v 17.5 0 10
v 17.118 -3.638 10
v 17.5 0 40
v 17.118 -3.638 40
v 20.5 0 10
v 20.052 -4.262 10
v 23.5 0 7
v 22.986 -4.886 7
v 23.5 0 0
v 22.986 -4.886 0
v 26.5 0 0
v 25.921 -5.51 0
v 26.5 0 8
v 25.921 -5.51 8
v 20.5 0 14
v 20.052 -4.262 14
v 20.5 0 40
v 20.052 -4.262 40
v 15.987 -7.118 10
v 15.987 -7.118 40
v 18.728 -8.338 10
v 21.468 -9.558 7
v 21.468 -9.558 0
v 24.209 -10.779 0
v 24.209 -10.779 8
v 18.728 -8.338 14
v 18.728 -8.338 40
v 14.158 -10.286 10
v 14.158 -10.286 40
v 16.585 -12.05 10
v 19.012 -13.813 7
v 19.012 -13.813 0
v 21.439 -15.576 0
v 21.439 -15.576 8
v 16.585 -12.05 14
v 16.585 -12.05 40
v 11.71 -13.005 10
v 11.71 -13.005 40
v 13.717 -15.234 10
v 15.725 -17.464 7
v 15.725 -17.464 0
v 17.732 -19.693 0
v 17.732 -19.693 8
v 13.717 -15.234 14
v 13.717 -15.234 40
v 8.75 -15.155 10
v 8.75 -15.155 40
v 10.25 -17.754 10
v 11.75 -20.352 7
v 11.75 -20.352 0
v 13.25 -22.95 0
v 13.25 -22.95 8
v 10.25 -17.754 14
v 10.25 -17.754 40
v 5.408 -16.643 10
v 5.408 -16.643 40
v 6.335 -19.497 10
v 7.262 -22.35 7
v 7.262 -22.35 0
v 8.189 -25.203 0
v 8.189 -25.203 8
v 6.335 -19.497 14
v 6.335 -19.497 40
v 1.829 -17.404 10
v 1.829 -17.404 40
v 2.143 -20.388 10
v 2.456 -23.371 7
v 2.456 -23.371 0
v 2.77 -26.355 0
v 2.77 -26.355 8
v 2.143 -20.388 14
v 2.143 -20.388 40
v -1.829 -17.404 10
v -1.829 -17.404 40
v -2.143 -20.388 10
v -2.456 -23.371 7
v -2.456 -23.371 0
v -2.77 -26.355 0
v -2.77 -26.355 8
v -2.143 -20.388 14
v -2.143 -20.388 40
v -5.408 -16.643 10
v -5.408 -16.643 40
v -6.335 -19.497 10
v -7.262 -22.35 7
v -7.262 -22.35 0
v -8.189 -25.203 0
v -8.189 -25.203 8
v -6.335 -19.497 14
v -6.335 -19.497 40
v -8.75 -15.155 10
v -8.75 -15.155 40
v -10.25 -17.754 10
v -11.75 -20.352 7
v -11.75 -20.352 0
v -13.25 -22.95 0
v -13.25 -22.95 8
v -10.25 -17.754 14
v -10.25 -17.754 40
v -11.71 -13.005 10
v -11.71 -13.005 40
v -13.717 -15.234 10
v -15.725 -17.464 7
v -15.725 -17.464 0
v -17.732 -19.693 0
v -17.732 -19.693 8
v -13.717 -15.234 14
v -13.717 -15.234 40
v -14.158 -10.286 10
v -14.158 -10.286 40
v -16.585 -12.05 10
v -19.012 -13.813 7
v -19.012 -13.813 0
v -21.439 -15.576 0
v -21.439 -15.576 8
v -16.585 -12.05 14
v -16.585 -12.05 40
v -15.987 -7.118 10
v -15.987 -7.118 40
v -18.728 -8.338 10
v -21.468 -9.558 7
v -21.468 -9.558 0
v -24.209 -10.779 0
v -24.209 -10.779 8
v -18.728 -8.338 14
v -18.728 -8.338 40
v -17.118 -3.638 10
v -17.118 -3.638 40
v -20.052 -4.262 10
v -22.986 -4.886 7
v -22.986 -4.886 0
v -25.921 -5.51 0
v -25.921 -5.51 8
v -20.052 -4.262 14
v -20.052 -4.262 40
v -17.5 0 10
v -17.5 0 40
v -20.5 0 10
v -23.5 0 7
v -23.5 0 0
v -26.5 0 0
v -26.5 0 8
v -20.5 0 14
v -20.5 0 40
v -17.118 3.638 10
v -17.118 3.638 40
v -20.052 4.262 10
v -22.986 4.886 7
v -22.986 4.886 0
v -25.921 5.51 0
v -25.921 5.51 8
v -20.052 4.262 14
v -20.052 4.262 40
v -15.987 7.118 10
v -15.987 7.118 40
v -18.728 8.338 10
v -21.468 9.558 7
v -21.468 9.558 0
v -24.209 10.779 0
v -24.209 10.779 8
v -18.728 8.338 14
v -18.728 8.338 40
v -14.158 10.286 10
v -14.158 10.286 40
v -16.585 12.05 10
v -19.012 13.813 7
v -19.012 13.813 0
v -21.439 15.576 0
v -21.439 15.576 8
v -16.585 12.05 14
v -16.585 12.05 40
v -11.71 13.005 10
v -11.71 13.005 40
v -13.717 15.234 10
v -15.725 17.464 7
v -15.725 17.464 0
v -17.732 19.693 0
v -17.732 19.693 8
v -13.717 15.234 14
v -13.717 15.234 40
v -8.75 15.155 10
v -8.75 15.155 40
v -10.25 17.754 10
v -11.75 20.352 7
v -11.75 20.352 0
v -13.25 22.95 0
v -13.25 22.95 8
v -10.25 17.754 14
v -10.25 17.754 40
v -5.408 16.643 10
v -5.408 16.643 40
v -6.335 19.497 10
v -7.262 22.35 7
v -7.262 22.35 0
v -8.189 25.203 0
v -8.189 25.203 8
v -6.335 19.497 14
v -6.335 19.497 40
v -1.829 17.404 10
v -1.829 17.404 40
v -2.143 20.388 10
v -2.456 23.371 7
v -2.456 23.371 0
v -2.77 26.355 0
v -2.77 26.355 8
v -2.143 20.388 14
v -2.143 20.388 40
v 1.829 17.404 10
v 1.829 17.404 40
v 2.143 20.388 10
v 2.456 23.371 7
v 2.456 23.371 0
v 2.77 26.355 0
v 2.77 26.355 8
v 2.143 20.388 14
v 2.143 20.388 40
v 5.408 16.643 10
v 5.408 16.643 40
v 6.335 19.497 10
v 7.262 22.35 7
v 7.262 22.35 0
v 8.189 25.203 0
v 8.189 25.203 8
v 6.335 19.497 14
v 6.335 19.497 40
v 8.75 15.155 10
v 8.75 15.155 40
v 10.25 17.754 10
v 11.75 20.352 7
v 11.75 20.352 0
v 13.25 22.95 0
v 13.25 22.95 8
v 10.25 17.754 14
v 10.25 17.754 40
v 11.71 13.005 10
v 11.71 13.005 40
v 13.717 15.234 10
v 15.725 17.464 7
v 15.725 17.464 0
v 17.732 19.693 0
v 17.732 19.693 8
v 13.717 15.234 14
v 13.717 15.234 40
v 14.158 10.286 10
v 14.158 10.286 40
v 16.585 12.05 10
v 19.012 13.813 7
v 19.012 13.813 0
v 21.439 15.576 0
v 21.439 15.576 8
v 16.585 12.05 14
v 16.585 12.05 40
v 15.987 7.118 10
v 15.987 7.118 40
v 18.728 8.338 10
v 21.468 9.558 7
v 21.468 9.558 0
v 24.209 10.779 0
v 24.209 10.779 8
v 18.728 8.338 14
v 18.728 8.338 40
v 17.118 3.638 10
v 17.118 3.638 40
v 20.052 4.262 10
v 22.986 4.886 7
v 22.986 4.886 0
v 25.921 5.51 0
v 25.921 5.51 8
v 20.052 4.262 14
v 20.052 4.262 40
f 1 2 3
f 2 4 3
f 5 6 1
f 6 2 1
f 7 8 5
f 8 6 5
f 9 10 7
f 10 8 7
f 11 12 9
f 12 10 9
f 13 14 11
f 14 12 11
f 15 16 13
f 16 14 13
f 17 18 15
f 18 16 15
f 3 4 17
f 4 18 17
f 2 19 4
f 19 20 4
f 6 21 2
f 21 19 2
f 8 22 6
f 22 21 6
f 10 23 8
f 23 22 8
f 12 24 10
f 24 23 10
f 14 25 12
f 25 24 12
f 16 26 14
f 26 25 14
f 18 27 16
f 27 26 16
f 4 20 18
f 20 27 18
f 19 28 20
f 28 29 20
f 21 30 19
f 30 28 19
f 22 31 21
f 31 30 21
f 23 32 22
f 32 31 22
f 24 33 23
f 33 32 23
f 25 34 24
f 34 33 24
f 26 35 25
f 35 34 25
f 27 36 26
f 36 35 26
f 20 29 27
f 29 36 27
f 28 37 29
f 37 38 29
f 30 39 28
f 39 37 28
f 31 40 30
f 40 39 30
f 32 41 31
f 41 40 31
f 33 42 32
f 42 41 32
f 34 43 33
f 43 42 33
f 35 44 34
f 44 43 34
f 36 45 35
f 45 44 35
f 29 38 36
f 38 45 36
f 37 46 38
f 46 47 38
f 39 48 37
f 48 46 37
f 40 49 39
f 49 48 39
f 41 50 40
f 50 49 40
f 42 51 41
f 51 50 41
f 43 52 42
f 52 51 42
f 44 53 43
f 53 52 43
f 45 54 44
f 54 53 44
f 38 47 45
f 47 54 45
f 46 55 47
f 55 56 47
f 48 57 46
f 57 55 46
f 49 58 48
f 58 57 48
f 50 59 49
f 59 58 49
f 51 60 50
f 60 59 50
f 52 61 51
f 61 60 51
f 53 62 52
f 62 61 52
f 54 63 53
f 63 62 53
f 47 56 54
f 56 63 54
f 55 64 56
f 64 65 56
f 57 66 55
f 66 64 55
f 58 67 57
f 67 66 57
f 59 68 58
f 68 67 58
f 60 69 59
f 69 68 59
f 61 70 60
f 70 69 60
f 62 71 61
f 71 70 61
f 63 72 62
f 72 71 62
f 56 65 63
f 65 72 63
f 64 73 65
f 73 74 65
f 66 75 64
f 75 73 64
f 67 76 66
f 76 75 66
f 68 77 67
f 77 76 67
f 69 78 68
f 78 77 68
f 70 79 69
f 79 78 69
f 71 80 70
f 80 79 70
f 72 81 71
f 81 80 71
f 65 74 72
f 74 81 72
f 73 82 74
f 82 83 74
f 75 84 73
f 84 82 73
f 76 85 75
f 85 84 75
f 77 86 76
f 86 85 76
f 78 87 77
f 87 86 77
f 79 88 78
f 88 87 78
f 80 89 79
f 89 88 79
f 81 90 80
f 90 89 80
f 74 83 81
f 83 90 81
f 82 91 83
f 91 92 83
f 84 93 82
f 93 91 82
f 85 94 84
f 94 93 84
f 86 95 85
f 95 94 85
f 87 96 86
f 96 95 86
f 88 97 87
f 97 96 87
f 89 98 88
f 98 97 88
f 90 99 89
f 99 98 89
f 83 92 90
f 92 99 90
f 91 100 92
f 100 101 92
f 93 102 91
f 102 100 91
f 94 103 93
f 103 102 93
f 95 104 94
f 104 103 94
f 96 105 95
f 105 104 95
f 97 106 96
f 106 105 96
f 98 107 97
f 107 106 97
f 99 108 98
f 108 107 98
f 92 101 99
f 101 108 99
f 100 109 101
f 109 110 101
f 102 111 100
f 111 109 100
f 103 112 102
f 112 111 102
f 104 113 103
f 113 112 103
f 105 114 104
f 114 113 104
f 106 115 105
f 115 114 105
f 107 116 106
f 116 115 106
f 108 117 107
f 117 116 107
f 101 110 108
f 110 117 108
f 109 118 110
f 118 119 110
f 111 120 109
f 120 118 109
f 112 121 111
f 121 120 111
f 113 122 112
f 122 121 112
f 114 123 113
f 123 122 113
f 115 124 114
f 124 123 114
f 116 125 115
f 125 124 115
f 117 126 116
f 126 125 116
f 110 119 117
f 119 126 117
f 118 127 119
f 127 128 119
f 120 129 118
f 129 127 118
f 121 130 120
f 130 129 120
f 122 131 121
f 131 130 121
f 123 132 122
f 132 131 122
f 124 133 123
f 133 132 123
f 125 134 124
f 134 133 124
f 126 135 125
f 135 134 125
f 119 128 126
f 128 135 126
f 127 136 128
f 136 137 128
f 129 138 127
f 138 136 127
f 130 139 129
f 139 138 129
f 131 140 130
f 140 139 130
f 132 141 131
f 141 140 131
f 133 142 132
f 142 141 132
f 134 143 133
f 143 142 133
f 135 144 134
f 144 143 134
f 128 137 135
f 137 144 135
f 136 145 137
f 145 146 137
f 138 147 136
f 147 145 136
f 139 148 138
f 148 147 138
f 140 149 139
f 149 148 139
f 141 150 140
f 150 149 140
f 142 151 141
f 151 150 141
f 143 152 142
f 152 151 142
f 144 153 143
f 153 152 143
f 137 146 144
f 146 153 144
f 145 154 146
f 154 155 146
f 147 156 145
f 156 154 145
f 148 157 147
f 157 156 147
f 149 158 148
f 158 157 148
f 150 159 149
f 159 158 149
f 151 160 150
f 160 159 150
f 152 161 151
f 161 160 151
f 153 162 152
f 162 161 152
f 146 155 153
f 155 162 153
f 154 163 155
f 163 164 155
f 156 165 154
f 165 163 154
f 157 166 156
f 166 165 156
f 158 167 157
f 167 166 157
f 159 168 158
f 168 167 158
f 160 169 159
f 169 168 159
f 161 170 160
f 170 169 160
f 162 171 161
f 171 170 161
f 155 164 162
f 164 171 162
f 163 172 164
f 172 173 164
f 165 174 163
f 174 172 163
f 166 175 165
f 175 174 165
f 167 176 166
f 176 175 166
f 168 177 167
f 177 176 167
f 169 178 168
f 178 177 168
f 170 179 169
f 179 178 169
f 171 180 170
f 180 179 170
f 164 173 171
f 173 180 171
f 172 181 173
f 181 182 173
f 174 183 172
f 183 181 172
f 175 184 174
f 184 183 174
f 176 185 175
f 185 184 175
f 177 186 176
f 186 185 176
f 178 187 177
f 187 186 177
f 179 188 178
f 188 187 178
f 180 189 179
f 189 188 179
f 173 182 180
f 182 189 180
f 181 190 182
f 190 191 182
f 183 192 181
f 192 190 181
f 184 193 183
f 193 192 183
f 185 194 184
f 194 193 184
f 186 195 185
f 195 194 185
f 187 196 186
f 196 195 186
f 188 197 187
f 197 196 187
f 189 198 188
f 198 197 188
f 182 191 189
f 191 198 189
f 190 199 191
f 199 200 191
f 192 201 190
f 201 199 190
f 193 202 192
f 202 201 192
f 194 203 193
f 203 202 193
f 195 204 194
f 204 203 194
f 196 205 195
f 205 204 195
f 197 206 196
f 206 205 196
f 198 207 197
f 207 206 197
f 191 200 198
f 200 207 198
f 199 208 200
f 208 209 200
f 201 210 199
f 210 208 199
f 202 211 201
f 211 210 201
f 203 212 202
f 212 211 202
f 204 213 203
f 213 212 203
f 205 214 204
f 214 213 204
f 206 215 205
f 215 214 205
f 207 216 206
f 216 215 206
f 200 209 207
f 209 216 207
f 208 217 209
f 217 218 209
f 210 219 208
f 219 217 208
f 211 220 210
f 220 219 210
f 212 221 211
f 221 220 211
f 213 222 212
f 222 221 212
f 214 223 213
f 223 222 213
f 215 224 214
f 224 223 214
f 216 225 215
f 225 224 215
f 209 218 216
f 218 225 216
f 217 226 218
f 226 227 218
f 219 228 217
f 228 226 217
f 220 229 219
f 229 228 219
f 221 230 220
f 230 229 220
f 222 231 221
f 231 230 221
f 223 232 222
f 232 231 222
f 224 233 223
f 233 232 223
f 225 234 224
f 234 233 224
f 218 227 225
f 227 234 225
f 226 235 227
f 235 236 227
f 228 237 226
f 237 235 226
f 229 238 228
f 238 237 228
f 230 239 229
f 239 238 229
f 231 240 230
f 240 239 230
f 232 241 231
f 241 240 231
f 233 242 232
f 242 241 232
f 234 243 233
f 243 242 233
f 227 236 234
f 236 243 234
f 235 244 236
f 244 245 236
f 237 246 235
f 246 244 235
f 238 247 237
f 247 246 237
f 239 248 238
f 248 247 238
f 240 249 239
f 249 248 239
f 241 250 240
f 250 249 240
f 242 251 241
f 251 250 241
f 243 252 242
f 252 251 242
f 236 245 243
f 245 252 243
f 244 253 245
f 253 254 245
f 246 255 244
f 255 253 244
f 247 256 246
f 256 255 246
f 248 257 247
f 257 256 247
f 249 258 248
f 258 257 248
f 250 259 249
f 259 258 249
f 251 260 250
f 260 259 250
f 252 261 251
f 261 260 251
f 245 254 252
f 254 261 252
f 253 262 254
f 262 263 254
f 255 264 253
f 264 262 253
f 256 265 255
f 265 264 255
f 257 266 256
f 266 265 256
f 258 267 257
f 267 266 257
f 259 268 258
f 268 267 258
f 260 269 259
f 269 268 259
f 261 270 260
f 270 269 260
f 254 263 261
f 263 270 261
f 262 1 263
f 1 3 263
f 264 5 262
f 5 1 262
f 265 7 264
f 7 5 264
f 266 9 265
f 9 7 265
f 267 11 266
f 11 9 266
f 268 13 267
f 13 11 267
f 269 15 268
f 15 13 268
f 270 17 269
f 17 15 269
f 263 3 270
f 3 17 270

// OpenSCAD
//rotate_extrude( angle=360)
//translate([2,0])
H1 =  (47- 35)/2;
H2 =  35/2;

T=3;

rotate_extrude( angle=360)
rotate([0,0,90])
translate([0,H2])
polygon([
    [0,H1],[7,H1],[10,H1-3], [10,0], [40,0], 
    [40,T], [10,T], [14,T], [8,H1+T], [0,H1+T]
]);
